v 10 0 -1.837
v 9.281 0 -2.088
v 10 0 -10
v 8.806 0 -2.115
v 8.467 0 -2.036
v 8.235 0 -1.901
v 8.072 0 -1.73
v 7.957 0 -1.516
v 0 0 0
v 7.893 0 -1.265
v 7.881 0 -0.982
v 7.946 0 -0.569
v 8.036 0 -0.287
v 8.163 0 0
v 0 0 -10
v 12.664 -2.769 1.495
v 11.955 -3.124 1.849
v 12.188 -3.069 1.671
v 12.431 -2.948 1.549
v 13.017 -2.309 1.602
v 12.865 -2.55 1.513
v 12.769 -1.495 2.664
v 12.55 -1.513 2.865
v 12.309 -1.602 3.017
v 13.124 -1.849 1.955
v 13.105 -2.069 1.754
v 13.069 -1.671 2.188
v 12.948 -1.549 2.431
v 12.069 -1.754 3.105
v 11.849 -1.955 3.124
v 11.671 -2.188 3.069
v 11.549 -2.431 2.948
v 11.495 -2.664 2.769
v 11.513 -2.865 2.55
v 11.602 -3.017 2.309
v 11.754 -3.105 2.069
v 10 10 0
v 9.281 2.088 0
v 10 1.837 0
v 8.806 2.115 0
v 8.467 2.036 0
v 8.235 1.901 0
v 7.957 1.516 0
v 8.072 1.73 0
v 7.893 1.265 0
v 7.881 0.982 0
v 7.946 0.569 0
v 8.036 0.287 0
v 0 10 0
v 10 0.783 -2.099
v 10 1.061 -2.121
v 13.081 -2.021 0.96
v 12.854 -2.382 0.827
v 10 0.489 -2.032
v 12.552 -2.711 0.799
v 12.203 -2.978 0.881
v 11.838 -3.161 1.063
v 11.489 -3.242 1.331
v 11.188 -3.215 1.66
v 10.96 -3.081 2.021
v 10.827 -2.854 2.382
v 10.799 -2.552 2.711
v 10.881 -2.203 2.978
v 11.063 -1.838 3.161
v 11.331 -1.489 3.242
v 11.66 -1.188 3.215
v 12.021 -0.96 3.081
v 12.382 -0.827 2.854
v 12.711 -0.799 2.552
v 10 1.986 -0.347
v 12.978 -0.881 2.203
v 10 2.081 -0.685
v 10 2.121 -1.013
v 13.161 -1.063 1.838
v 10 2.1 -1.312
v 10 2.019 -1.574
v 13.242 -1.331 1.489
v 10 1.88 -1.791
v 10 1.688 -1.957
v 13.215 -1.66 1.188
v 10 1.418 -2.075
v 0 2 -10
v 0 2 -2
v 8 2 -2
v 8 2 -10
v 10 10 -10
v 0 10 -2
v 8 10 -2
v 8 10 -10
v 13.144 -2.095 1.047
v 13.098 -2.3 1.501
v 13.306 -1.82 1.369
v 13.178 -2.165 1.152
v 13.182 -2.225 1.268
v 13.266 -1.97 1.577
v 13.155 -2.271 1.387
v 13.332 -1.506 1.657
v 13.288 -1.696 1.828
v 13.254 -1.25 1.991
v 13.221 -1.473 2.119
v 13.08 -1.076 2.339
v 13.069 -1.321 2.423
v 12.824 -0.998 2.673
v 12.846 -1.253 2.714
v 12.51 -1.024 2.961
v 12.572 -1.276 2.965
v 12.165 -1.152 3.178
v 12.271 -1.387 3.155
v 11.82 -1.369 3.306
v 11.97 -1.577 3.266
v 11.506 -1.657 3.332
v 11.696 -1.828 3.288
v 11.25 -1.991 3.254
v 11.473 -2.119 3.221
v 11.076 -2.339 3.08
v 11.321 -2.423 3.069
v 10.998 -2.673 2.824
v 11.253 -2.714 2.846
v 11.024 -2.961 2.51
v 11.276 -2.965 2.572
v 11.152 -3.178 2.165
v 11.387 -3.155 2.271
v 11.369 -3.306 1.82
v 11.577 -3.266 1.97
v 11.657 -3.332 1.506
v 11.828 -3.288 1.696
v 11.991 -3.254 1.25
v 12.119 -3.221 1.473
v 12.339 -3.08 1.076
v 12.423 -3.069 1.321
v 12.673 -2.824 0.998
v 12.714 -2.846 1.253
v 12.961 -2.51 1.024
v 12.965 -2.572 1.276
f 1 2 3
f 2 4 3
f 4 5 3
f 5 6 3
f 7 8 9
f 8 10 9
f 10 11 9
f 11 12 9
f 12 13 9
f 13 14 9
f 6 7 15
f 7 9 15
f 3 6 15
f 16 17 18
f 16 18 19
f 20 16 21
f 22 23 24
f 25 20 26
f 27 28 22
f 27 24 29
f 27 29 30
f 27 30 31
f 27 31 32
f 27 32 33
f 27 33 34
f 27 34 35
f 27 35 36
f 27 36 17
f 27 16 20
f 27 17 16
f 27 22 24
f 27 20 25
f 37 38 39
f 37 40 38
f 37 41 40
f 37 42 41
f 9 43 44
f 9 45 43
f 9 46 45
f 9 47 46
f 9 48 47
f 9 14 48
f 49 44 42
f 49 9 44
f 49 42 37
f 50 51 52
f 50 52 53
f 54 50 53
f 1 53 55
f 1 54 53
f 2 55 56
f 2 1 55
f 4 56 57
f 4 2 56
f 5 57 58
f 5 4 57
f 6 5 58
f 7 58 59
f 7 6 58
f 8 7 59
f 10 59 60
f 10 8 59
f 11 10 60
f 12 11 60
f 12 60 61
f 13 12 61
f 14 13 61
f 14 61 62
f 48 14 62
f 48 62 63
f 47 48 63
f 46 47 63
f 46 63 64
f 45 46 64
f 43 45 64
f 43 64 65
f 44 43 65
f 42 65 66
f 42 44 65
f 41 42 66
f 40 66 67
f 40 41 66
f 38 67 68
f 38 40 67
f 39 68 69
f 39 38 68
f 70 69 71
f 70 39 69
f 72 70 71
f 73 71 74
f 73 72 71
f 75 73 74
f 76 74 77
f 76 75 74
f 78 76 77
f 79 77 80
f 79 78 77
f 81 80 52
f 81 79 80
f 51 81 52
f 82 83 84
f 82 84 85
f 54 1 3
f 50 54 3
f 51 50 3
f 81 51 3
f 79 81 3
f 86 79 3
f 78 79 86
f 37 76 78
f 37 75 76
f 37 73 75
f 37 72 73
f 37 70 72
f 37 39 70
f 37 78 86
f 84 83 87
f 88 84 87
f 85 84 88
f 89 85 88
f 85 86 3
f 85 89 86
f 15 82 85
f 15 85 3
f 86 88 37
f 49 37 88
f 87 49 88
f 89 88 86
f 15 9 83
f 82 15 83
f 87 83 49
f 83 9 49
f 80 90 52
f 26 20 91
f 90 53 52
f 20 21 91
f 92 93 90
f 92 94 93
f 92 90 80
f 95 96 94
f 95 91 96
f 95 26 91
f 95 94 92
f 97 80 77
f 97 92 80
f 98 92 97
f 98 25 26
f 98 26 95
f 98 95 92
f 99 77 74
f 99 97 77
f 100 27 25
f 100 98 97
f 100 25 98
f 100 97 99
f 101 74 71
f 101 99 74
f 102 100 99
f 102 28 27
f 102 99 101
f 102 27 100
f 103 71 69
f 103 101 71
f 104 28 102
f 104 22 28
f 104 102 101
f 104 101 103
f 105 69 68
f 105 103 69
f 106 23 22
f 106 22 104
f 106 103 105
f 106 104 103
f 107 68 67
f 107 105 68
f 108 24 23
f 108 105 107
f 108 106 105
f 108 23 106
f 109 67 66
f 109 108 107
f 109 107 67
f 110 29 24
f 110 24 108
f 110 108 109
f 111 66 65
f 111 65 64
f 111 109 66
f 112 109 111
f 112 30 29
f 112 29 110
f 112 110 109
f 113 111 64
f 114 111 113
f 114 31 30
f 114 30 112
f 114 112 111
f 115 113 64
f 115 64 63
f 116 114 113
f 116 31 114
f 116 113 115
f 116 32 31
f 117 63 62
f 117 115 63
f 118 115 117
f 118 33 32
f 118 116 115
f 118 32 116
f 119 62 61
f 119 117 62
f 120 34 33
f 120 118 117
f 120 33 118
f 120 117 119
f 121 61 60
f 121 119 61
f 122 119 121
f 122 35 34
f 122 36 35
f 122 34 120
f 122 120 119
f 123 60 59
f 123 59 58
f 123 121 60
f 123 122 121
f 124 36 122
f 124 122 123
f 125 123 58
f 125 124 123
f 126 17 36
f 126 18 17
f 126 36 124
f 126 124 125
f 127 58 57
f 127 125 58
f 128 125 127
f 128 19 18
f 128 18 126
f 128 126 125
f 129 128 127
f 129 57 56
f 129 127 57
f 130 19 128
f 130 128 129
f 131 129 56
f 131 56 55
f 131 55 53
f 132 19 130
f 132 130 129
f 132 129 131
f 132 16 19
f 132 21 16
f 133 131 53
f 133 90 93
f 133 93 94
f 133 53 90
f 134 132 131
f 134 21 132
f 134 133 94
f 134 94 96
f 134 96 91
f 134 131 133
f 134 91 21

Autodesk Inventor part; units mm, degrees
ref_plane "YZ Plane" through (0, 0, 0) normal (1, 0, 0) x (0, 1, 0)
ref_plane "XZ Plane" through (0, 0, 0) normal (0, 1, 0) x (-1, 0, 0)
sketch "Sketch1" plane through (0, 0, 0) normal (1, 0, 0) x (0, 1, 0)
  line L0 (0, 0) -> (10, 0)
  line L1 (0, 0) -> (0, -10)
  line L2 (10, 0) -> (10, -10)
  line L3 (10, -10) -> (0, -10)
  dimension "d0" = 10
  dimension "d1" = 10
extrude "Extrusion1" add sketch "Sketch1" along normal blind 10
shell "Shell1" thickness 2 removed faces 3 at (3.3333, 10, -3.3333) at (3.3333, 6.6667, -10) at (0, 3.3333, -3.3333)
ref_plane "Work Plane2" through (10, 0, 0) normal (-0.5774, 0.5774, -0.5774) x (0.7071, 0, -0.7071)
ref_plane "Work Plane1" through (0, 10, -2) normal (-0.5774, 0.5774, -0.5774) x (0.7071, 0, -0.7071)
sketch "Sketch2" plane through (10, 0, 0) normal (-0.5774, 0.5774, -0.5774) x (0.7071, 0, -0.7071)
  line L0 (0, -8.165) -> (0, 0) projected
  line L1 (-7.0711, 4.0825) -> (0, 0) projected
  line L2 (0, 0) -> (7.0711, 4.0825) projected
  line L3 (0, -6.532) -> (0, 0) projected
  circle A0 centre (0, 0) radius 1.5
  dimension "d5" = 3
extrude "Extrusion2" add sketch "Sketch2" along normal up to next
sketch "Sketch3" plane through (10, 0, 0) normal (0.5774, -0.5774, 0.5774) x (0.7071, 0, -0.7071)
  point P0 (-7.0711, -4.0825)
sketch "Sketch4" plane through (10, 0, 0) normal (0.5774, -0.5774, 0.5774) x (0.7071, 0, -0.7071)
  circle A0 centre (0, 0) radius 1.5 projected
  point P0 (-7.0711, -4.0825)
extrude "Extrusion3" add sketch "Sketch4" along normal blind 4
fillet "Fillet1" radius 0.5 1 edges at (11.2487, -2.3094, 3.3701)
properties part number "Corners"
